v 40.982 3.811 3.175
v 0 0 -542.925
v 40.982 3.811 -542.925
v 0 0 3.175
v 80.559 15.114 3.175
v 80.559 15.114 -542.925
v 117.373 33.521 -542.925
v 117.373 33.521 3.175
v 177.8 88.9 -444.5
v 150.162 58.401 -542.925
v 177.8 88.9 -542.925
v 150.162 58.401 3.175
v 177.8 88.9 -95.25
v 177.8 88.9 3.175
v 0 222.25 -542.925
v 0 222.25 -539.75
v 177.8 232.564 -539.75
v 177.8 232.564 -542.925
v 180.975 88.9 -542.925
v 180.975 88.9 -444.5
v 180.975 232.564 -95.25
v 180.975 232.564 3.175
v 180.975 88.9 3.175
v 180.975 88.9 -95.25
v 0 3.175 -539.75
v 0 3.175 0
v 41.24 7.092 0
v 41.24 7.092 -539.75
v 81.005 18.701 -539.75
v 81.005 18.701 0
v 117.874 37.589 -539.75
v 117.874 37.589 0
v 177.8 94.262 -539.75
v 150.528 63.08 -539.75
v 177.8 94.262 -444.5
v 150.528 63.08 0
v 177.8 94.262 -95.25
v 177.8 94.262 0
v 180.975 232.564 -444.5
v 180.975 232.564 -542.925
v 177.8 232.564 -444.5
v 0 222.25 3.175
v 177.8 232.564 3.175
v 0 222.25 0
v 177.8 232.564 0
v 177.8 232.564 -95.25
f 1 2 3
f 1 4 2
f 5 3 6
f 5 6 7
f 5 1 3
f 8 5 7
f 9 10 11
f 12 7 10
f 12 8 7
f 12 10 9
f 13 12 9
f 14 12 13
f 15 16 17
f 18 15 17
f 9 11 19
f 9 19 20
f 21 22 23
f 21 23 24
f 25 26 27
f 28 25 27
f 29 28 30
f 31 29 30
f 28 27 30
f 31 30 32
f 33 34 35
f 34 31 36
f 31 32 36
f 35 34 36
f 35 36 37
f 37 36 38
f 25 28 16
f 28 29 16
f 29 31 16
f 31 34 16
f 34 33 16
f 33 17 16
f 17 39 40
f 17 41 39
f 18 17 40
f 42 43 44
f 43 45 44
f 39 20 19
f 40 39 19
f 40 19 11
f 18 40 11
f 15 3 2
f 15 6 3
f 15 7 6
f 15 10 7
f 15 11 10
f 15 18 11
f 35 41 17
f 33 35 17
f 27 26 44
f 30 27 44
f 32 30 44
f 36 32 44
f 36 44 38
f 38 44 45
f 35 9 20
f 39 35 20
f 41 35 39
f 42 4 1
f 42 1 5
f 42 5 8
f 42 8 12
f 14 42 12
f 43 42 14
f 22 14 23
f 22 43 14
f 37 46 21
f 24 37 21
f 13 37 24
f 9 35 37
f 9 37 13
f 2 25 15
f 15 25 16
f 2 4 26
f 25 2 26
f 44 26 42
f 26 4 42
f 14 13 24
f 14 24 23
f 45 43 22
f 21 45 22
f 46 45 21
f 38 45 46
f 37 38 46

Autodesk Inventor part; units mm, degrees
ref_plane "YZ Plane" through (0, 0, 0) normal (1, 0, 0) x (0, 1, 0)
ref_plane "XZ Plane" through (0, 0, 0) normal (0, 1, 0) x (-1, 0, 0)
ref_plane "XY Plane" through (0, 0, 0) normal (0, 0, 1) x (1, 0, 0)
sketch "Sketch1" plane through (0, 0, 0) normal (0, 0, 1) x (1, 0, 0)
  arc A0 (0, 0) -> (177.8, 88.9) centre (0, 222.25) ccw
  line L0 (0, 0) -> (177.8, 0) construction
  arc A1 (0, 3.175) -> (177.8, 94.2617) centre (0, 222.25) ccw
  line L1 (0, 3.175) -> (0, 0)
  line L2 (177.8, 88.9) -> (177.8, 94.2617)
  dimension "d0" = 222.25
  dimension "d7" = 3.175
  dimension "d9" = 3.175
  dimension "d12" = 177.8
  dimension "d13" = 177.8
extrude "Extrusion1" add sketch "Sketch1" against normal blind 539.75
sketch "Sketch2" plane through (0, 0, 0) normal (0, 0, 1) x (1, 0, 0)
  arc A0 (0, 0) -> (177.8, 88.9) centre (0, 222.25) ccw projected
  line L0 (177.8, 88.9) -> (177.8, 232.5642)
  line L1 (177.8, 232.5642) -> (0, 222.25)
  line L2 (0, 222.25) -> (0, 0)
  dimension "d14" = 93.32
  dimension "d15" = 0
extrude "Extrusion2" add sketch "Sketch2" along normal blind 3.175
ref_plane "Work Plane1" through (0, 0, -269.875) normal (0, 0, -1) x (-1, 0, 0)
mirror "Mirror1" about plane through (0, 0, -269.875) normal (0, 0, -1) of "Extrusion2"
sketch "Sketch3" plane through (177.8, 94.2617, 0) normal (1, 0, 0) x (0, 0, -1)
  line L0 (542.925, -5.3617) -> (-3.175, -5.3617) projected
  line L1 (-3.175, 138.3025) -> (95.25, 138.3025)
  line L2 (95.25, 138.3025) -> (95.25, -5.3617)
  line L3 (95.25, -5.3617) -> (-3.175, -5.3617)
  line L4 (-3.175, -5.3617) -> (-3.175, 138.3025)
  line L5 (0, 138.3025) -> (-3.175, 138.3025) projected
  line L6 (-3.175, -5.3617) -> (-3.175, 138.3025) projected
  line L7 (542.925, -5.3617) -> (444.5, -5.3617)
  line L8 (444.5, -5.3617) -> (444.5, 138.3025)
  line L9 (444.5, 138.3025) -> (542.925, 138.3025)
  line L10 (542.925, 138.3025) -> (542.925, -5.3617)
  line L11 (539.75, 138.3025) -> (542.925, 138.3025) projected
  point P0 (0, -94.2617)
  dimension "d19" = 98.425
  dimension "d20" = 98.425
extrude "Extrusion3" add sketch "Sketch3" along normal blind 3.175
properties material "Aluminum 6061"
